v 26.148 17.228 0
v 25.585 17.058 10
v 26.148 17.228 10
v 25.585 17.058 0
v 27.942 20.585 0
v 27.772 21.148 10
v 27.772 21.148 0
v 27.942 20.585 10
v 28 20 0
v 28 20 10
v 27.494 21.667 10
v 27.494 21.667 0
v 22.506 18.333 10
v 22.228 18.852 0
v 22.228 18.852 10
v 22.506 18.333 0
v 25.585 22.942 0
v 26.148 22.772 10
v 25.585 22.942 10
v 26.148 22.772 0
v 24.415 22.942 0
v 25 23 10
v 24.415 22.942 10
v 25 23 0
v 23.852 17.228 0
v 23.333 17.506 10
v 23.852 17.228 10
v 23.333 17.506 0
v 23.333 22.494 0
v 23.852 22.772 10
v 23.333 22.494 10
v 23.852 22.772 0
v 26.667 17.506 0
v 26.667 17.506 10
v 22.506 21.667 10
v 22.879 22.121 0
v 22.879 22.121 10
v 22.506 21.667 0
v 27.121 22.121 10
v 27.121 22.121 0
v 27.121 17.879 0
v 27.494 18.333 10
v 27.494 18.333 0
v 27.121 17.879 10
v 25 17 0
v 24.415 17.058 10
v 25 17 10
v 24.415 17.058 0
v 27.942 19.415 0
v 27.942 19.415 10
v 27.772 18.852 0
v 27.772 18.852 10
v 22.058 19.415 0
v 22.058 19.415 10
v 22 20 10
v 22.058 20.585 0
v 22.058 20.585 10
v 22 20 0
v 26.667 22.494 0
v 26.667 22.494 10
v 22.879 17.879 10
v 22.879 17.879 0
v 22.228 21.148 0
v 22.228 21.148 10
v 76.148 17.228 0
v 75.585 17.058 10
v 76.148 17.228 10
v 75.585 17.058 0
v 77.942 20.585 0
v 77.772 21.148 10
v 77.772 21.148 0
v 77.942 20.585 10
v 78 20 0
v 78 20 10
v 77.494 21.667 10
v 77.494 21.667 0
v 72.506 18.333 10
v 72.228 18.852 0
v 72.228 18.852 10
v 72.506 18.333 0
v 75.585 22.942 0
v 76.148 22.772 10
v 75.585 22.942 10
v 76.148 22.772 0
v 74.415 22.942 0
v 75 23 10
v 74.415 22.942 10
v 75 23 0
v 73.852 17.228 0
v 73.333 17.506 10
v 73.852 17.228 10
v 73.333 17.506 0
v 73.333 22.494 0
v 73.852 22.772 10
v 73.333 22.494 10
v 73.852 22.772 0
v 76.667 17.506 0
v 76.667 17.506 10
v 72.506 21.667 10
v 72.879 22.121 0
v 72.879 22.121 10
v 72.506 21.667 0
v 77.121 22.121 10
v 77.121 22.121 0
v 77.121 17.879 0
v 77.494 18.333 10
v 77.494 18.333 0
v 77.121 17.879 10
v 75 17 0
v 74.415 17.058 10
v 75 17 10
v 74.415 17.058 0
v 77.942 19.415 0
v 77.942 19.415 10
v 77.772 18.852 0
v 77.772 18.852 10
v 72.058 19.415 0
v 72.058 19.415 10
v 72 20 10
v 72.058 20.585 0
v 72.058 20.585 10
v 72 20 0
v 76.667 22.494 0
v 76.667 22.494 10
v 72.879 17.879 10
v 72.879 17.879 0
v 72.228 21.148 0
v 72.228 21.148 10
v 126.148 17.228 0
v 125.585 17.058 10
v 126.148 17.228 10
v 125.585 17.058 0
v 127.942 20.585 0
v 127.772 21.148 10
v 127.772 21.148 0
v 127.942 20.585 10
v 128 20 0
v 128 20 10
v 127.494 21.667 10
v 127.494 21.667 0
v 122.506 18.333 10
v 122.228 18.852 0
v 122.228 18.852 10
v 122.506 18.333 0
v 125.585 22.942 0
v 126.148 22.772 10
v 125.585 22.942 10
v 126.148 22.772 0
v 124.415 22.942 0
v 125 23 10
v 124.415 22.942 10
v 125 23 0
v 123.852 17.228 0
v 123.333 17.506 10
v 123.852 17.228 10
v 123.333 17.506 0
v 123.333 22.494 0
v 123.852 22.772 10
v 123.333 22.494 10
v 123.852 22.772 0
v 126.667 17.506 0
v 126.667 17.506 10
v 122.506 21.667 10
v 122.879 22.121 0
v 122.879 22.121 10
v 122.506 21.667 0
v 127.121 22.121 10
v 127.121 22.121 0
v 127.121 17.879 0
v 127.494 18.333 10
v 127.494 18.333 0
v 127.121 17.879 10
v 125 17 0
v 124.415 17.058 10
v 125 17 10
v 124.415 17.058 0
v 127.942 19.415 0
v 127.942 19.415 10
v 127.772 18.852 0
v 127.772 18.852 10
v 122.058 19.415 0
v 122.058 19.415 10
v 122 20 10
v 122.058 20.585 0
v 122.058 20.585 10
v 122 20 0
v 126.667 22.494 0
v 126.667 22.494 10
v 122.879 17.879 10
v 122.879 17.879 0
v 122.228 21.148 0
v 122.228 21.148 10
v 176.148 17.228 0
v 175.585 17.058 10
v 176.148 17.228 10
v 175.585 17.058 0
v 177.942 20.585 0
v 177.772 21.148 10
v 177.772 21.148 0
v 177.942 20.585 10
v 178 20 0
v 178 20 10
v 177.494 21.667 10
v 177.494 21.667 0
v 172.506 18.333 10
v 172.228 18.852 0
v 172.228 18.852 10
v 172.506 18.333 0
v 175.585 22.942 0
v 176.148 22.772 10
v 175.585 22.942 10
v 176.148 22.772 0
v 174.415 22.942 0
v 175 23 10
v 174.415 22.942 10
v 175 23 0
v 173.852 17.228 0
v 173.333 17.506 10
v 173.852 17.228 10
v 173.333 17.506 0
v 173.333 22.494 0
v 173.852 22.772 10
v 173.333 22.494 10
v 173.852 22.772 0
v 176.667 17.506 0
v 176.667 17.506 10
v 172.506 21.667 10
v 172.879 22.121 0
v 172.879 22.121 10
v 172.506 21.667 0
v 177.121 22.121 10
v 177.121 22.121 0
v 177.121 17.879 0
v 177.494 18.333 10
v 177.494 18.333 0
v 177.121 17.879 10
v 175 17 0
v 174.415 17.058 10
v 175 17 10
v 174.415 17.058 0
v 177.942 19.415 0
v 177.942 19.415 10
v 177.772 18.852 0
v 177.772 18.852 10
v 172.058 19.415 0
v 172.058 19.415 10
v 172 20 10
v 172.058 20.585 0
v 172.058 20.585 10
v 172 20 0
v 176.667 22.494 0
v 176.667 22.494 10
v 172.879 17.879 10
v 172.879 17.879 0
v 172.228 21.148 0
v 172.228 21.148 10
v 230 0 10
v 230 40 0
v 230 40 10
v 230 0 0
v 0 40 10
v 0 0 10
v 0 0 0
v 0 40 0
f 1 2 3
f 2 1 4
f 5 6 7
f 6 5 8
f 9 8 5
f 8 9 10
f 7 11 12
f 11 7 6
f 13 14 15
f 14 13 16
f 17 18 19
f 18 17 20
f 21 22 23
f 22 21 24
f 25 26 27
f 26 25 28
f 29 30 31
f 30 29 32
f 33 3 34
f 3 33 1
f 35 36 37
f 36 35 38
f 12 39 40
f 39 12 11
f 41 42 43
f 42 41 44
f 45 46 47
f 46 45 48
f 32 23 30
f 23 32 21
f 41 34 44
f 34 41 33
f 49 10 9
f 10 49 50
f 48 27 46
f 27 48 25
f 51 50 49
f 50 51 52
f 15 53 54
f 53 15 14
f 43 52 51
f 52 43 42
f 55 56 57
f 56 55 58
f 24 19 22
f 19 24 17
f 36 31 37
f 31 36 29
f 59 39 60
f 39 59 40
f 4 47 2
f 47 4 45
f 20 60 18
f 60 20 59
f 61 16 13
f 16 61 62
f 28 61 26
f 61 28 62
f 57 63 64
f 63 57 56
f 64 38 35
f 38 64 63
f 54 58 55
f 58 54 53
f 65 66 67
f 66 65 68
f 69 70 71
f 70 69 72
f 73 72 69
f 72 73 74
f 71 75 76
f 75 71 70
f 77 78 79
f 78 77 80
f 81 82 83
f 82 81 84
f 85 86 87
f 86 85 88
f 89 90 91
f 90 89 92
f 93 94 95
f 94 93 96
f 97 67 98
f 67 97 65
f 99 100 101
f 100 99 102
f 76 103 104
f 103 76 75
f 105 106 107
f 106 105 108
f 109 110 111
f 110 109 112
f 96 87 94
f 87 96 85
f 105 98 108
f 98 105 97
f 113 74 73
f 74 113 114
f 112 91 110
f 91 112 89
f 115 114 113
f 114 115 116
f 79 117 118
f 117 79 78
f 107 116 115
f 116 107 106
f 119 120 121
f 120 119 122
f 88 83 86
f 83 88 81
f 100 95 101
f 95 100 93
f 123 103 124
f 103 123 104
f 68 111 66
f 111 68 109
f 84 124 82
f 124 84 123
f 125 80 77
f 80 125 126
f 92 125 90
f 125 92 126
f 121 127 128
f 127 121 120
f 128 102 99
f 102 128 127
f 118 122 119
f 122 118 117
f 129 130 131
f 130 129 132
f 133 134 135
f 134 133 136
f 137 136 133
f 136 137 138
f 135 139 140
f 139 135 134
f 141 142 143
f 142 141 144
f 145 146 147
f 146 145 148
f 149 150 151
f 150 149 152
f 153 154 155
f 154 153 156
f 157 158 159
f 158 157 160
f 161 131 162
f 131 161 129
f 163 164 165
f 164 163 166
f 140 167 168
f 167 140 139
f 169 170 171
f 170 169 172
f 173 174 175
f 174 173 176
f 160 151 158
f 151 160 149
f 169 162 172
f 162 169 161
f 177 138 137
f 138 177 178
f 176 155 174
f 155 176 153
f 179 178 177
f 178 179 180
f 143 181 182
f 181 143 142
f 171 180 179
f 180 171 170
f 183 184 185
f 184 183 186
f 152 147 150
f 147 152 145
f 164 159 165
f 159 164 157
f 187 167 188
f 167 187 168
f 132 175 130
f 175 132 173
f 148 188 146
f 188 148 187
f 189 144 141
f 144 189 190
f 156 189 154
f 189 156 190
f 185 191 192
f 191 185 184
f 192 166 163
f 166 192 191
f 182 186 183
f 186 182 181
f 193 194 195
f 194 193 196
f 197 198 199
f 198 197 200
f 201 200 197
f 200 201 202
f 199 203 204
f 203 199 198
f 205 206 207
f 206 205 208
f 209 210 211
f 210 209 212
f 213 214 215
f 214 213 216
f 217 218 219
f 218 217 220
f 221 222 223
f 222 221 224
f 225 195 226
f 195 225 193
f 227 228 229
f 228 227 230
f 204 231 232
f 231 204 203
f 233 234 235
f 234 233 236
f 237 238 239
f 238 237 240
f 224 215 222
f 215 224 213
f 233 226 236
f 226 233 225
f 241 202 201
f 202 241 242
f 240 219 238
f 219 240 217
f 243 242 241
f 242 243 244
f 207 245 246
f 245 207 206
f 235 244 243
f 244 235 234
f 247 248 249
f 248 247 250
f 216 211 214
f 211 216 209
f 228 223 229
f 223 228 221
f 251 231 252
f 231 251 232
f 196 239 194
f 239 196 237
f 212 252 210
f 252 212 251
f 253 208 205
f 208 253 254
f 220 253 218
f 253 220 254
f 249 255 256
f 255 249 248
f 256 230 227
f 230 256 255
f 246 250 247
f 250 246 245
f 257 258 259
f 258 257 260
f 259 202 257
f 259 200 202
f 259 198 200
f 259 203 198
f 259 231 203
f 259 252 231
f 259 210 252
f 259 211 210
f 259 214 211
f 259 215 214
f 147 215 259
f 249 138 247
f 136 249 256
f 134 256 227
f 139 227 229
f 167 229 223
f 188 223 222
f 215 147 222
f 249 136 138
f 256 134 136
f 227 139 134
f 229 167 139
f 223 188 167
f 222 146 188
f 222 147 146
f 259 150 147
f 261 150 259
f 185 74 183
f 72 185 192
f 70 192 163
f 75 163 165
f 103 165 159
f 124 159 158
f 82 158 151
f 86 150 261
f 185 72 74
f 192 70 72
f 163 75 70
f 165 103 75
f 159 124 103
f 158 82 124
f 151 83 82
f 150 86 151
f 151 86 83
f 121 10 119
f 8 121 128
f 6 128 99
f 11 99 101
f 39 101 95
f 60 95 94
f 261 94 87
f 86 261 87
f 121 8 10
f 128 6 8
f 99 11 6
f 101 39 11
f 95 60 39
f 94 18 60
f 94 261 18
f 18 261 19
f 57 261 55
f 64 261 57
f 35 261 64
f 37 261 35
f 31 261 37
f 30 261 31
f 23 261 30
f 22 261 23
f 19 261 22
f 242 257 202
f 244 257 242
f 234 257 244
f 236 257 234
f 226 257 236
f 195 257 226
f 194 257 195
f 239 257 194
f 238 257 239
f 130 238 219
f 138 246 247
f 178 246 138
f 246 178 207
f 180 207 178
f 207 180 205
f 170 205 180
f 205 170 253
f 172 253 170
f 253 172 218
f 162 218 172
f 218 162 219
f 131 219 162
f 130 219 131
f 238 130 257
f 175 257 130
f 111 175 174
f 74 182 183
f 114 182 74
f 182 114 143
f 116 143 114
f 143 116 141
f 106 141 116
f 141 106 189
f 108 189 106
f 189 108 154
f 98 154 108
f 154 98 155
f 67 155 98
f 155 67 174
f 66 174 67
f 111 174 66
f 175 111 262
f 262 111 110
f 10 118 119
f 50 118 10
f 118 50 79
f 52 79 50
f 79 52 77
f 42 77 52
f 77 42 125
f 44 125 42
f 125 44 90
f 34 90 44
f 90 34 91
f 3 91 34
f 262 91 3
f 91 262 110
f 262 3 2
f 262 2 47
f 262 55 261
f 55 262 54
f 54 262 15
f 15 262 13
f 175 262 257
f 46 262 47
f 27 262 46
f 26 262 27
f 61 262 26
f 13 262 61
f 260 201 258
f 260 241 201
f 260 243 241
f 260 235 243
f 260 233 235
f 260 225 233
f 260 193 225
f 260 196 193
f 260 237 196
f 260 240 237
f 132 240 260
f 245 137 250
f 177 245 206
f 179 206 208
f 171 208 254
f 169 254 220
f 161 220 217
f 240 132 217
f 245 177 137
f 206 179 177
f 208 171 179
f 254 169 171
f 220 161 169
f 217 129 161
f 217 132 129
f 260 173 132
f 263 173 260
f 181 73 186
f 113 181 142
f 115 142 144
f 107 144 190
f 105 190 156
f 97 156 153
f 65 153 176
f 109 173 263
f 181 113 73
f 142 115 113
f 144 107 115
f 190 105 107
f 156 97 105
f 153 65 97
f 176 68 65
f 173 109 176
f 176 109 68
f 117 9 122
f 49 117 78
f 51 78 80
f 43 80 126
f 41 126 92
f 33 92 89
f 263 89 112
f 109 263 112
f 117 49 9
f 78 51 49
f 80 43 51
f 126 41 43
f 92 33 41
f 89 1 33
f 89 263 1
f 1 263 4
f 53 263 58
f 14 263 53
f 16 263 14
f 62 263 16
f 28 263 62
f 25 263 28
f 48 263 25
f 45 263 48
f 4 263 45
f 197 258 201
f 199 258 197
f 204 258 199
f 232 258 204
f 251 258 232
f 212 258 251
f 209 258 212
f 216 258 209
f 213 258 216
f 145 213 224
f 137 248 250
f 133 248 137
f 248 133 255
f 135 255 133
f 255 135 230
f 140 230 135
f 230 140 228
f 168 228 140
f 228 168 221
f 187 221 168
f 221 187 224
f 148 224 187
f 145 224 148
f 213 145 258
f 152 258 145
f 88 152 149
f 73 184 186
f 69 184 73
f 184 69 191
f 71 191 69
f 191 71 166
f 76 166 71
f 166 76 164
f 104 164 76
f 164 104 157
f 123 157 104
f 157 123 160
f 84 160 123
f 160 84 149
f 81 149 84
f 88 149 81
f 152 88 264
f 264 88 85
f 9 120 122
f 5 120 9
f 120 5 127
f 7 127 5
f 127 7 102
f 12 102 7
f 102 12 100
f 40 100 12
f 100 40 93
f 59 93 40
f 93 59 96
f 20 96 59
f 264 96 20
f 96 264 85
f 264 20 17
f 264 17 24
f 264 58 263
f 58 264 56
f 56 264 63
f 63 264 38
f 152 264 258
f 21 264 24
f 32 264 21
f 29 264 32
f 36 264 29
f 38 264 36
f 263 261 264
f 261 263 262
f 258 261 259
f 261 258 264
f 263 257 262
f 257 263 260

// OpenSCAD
$fn = 32;

// ----------------------------------------------------------------------
// Long rail: 200-250 mm mounting rail
// ----------------------------------------------------------------------

// --- parameters (mm) ---
rail_l = 230;             // rail length, X
rail_w = 40;              // rail width, Y
rail_t = 10;              // rail thickness, Z
hole_d = 6;               // mounting hole diameter
hole_start = 25;          // first hole offset from the end
hole_pitch = 50;          // hole pitch
holes = 4;                // number of holes

difference() {
  cube([rail_l, rail_w, rail_t]);
  for (i = [0 : holes - 1])
    translate([hole_start + i * hole_pitch, rail_w / 2, -1])
      cylinder(h = rail_t + 2, d = hole_d);
}
